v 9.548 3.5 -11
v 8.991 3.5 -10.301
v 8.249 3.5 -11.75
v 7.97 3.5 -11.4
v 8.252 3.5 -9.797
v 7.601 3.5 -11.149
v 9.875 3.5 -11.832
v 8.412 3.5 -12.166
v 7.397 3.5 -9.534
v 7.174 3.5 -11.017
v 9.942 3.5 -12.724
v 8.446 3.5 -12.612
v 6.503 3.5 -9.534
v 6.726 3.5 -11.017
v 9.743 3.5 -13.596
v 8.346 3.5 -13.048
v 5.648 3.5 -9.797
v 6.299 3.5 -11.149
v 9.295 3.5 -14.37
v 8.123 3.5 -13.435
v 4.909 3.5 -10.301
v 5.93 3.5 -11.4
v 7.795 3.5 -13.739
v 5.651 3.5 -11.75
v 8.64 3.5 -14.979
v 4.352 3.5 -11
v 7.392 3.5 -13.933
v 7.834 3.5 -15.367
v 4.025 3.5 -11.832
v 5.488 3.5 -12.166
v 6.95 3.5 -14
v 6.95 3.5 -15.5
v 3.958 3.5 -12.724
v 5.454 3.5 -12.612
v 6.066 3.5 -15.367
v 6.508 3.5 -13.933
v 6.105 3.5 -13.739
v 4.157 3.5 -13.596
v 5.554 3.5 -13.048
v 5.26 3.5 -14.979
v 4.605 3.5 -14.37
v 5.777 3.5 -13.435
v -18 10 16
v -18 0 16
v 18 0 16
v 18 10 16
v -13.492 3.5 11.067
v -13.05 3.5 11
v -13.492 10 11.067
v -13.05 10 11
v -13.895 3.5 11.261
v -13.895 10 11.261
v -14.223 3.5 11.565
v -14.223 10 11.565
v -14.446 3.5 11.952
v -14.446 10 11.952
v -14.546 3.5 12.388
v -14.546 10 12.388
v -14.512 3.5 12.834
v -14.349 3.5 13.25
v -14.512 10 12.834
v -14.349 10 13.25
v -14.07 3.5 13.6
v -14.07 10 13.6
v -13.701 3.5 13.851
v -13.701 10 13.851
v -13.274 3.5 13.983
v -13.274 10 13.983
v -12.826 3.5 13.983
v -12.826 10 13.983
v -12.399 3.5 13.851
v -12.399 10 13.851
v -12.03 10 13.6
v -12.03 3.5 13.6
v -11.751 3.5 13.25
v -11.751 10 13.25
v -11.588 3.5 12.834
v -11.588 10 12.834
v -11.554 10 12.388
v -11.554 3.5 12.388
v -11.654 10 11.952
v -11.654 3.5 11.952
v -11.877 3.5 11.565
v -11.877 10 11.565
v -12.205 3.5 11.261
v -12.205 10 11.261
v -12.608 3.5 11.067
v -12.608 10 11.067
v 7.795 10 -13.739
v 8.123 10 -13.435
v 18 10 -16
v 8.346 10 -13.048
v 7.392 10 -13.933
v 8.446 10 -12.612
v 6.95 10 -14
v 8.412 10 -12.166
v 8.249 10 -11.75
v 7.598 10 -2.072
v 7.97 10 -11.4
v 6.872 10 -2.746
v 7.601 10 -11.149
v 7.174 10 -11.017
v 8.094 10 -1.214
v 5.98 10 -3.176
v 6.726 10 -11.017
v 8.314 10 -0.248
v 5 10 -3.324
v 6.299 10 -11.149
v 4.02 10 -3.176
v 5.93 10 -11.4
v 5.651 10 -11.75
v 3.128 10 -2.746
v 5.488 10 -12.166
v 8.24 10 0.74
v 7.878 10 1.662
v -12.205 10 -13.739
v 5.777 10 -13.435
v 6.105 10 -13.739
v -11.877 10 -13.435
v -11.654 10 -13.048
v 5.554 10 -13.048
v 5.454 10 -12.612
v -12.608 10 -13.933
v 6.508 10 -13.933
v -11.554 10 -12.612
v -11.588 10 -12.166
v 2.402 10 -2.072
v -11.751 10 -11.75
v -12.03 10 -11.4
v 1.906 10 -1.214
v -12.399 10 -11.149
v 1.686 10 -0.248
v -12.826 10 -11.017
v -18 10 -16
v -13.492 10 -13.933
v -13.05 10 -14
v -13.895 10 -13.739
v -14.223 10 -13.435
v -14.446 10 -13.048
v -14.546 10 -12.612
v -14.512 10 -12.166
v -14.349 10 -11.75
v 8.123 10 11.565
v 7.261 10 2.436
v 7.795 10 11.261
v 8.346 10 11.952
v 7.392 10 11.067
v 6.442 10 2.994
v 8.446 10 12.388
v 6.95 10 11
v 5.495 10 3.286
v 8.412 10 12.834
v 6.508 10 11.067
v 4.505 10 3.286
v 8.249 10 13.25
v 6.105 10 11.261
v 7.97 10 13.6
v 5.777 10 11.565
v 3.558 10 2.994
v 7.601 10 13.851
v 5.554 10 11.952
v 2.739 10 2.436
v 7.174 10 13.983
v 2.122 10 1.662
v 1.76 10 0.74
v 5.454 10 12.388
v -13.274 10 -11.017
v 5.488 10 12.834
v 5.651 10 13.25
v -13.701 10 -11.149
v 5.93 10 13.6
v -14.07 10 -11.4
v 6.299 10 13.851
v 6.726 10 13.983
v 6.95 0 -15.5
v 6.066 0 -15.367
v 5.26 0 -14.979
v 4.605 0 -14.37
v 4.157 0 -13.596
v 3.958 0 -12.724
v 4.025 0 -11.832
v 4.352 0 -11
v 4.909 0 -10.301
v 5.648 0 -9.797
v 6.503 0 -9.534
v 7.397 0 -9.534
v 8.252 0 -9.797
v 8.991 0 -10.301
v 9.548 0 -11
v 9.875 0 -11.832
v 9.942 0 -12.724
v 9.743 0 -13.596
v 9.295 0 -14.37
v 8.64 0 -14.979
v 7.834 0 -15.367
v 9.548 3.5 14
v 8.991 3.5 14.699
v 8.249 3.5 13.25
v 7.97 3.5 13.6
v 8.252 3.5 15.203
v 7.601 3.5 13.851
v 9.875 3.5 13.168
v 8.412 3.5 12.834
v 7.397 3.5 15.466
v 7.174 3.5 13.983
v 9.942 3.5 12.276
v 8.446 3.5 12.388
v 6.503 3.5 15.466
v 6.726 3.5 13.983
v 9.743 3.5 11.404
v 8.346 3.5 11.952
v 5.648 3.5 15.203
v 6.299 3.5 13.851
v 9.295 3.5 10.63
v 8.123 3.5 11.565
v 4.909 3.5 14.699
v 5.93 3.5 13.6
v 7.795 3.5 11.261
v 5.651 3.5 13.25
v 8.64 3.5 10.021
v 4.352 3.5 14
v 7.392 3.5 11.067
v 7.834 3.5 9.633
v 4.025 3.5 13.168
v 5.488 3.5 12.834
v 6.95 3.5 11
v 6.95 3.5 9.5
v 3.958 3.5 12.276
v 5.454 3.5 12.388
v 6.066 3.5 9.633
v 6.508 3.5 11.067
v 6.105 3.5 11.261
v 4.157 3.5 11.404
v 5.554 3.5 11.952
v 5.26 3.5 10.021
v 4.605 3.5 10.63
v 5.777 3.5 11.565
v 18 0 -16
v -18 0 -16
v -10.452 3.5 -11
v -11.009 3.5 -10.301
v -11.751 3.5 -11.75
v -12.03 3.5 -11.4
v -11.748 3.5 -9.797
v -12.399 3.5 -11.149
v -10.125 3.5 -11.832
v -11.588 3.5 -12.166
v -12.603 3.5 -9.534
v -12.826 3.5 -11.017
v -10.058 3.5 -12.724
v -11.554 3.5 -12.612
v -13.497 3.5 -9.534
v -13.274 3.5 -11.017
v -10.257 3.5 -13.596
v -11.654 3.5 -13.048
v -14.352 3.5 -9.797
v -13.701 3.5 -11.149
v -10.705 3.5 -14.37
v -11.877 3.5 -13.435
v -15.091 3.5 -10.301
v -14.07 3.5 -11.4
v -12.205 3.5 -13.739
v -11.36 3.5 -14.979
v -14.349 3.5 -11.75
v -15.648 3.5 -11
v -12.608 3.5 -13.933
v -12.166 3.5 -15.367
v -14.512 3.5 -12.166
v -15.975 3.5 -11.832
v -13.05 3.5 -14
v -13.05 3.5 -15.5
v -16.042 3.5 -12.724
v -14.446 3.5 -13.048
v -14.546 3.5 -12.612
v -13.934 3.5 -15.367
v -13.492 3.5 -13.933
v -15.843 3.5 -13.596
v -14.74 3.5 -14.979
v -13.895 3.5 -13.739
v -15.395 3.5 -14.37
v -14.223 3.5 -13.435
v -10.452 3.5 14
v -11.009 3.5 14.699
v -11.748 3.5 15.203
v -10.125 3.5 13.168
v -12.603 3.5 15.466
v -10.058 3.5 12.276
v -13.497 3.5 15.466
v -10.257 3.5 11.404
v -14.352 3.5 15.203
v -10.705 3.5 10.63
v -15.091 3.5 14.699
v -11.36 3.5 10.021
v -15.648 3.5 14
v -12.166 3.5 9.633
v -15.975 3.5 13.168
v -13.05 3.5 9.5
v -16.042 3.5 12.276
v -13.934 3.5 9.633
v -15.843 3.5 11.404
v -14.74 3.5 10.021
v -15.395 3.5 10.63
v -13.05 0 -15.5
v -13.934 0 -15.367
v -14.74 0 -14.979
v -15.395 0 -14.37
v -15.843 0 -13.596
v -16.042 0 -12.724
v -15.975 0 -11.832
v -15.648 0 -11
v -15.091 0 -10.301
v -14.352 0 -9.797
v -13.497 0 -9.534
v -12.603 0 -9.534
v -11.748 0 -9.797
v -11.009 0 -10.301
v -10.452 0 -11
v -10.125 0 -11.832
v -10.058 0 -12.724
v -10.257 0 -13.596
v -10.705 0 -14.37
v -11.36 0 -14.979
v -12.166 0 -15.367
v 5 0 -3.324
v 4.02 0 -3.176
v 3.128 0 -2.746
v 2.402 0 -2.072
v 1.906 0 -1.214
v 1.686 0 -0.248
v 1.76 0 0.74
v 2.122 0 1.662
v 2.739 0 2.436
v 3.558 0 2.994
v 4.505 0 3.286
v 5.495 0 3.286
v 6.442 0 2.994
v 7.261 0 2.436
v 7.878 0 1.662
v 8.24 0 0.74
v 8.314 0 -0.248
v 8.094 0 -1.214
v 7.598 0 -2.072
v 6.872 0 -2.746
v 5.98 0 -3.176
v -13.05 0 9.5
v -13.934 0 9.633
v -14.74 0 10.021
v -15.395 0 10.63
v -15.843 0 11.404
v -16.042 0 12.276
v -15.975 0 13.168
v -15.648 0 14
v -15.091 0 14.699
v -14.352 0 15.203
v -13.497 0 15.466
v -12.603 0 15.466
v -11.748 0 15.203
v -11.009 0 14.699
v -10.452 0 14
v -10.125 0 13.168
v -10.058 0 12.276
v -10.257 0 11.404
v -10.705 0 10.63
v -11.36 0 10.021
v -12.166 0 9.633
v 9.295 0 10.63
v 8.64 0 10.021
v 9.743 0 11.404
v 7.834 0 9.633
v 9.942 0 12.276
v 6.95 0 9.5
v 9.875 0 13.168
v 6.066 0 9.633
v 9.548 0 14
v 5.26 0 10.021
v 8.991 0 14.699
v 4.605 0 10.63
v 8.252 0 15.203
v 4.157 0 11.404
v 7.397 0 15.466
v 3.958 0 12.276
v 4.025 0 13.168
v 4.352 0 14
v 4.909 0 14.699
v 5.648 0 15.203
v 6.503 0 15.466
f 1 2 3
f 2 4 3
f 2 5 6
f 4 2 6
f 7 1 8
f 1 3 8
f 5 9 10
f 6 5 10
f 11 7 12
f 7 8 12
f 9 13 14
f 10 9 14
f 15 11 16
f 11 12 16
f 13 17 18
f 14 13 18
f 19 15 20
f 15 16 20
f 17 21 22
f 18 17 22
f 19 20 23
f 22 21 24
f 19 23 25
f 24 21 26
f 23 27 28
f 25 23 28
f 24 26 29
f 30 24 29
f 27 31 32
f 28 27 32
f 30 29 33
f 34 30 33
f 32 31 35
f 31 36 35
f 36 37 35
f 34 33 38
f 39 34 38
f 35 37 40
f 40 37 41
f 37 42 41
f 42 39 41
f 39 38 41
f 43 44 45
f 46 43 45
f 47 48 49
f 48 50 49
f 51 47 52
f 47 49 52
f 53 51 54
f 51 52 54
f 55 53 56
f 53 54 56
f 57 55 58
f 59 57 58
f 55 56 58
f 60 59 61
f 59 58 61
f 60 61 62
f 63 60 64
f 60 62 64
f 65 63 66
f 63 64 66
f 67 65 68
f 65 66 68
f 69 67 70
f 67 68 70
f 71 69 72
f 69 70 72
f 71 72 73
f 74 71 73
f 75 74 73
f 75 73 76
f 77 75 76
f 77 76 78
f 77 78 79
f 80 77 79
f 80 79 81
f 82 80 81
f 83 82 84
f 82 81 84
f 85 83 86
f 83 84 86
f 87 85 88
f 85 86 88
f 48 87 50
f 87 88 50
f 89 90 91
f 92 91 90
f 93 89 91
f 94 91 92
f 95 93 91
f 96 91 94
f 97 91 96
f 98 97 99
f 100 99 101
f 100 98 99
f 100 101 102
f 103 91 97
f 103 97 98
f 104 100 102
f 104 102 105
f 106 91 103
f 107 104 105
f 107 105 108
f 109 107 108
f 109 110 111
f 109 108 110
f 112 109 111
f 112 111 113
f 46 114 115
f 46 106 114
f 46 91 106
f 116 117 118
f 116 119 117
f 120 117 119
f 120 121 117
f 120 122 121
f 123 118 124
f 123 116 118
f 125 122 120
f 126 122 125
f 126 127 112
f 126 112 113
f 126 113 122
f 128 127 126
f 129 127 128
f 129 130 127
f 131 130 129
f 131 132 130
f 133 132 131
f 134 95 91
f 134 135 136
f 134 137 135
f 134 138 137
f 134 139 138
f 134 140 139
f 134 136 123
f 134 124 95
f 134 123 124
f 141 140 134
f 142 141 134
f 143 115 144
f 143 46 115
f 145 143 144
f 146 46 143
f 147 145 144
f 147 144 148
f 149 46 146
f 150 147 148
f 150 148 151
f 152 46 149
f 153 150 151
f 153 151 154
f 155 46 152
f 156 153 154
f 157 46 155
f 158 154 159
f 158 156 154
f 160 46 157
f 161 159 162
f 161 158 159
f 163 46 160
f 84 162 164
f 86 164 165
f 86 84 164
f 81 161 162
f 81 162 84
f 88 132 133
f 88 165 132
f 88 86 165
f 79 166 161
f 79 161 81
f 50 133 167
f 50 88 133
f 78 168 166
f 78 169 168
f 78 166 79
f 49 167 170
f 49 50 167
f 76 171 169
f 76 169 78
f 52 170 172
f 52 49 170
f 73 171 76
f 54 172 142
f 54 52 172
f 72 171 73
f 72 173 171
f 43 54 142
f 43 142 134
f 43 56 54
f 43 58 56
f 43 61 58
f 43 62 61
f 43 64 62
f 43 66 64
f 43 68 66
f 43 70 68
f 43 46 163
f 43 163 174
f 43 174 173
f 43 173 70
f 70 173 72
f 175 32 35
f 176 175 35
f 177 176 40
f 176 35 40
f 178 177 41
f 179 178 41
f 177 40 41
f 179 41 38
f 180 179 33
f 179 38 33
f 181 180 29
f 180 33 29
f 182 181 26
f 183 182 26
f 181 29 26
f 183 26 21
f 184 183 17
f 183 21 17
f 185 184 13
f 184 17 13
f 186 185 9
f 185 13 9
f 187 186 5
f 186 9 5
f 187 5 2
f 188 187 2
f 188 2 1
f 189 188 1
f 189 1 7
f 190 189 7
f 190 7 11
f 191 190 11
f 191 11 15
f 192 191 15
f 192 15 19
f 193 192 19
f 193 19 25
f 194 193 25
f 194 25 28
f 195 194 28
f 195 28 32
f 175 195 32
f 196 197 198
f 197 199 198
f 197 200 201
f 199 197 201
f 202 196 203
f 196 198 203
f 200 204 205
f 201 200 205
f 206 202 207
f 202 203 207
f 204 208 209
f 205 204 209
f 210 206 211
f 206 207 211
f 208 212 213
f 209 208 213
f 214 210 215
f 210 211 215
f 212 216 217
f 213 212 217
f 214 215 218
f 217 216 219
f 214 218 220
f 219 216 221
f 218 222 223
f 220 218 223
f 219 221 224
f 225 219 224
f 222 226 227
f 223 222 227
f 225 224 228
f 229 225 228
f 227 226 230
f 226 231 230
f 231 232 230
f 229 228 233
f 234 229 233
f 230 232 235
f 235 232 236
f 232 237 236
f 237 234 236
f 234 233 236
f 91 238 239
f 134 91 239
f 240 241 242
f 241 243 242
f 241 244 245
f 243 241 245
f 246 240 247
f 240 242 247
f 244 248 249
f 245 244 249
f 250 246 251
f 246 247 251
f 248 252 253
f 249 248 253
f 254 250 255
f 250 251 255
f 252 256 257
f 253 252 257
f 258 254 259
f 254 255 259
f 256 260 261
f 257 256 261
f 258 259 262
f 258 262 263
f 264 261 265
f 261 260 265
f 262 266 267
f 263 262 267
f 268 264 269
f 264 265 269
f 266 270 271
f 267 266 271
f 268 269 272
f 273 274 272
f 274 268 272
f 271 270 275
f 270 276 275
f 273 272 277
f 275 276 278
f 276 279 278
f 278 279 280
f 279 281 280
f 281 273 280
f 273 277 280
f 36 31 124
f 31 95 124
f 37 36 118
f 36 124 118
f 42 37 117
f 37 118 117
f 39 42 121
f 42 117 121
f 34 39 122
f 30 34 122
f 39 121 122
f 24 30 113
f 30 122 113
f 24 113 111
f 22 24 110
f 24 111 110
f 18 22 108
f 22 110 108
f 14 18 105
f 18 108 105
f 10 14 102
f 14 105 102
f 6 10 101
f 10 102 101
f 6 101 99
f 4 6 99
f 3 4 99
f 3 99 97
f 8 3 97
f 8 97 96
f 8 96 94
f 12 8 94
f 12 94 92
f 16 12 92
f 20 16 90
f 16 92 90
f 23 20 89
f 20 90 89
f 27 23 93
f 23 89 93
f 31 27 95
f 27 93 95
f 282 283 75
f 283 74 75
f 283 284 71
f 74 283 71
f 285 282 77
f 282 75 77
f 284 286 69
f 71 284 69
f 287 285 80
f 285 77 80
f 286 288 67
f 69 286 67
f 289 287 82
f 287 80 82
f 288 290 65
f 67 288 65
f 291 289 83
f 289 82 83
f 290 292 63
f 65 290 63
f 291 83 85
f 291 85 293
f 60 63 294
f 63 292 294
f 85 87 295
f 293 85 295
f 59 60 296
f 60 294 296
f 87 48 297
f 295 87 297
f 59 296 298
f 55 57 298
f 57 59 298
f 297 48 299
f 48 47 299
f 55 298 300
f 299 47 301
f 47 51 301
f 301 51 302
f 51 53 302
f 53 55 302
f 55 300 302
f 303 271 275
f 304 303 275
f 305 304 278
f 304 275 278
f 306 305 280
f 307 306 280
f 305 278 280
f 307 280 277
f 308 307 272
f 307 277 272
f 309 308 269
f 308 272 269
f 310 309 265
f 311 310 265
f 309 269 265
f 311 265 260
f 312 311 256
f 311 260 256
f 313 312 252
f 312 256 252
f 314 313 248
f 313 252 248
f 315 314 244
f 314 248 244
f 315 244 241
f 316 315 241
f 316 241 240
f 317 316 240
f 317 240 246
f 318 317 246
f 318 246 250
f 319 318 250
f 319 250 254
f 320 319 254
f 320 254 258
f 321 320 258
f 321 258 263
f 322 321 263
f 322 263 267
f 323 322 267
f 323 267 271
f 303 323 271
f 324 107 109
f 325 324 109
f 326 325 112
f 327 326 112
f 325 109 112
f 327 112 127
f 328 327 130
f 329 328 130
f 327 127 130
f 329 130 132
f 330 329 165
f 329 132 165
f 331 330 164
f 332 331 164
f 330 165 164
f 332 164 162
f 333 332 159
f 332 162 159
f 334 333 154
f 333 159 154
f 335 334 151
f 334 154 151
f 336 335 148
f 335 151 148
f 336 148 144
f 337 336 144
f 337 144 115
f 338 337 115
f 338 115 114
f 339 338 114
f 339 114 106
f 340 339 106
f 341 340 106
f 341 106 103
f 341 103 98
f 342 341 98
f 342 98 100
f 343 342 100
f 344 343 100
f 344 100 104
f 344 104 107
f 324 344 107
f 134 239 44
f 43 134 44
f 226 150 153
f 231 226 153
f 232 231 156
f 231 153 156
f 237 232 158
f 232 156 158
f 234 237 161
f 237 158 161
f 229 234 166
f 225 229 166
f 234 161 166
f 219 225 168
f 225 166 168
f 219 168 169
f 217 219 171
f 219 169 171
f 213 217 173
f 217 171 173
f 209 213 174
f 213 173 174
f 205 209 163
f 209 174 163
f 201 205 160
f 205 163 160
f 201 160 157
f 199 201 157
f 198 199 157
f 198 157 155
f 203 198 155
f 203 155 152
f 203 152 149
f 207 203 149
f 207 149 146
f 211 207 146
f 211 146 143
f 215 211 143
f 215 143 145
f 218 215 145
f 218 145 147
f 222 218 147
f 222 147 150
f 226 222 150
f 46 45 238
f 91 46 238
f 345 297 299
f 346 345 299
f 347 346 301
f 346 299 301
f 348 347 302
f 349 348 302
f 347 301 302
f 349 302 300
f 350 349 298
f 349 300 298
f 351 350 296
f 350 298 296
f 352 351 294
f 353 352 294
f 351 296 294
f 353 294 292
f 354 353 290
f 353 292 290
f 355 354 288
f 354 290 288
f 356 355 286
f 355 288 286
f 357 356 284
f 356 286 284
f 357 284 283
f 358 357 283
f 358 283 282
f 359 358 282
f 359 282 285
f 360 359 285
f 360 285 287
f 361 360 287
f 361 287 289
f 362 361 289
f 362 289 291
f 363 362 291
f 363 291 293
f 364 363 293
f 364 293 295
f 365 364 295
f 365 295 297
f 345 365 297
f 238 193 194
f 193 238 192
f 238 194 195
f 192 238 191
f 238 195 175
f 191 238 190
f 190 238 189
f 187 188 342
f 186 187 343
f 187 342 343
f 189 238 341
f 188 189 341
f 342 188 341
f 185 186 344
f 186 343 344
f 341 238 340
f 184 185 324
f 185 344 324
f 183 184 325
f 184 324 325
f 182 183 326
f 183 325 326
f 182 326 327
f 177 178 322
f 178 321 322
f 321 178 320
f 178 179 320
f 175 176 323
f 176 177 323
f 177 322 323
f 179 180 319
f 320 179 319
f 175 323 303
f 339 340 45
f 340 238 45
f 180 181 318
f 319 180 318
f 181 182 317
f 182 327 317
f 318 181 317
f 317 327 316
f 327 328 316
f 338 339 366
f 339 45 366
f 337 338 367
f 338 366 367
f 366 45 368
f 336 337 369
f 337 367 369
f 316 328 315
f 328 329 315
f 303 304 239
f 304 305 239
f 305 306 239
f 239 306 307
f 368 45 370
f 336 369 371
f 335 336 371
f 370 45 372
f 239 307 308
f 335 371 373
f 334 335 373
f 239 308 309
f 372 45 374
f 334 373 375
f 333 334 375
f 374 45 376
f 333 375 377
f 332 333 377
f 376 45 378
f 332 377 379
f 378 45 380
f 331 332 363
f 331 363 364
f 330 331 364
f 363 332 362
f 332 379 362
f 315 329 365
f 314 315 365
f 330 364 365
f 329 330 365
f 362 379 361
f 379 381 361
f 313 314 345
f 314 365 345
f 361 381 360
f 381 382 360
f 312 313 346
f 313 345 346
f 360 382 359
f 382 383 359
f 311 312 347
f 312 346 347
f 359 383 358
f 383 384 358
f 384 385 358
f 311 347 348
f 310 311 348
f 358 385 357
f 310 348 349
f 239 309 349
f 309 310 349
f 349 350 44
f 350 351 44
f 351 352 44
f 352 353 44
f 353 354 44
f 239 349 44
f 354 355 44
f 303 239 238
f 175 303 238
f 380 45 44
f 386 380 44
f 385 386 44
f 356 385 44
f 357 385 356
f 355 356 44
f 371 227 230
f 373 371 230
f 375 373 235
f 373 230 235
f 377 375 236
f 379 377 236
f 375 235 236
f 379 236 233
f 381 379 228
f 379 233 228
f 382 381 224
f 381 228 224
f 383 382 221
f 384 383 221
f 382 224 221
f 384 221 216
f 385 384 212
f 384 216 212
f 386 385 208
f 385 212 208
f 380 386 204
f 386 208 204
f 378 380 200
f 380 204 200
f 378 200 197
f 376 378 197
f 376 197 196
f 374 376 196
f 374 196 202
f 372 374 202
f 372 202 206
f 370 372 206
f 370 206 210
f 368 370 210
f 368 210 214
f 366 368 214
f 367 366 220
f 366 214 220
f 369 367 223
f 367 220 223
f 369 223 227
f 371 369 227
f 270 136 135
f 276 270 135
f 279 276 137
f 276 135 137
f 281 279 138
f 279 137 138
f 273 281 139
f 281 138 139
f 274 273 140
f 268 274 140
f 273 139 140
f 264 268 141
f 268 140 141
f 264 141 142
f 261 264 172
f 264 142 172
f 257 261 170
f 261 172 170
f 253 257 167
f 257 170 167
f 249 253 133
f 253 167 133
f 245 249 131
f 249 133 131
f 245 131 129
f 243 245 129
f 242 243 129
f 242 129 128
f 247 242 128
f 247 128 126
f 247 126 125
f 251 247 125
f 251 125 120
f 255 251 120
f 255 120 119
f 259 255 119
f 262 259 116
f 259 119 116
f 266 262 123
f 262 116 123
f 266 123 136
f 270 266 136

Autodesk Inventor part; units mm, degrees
ref_plane "YZ Plane" through (0, 0, 0) normal (1, 0, 0) x (0, 1, 0)
ref_plane "XZ Plane" through (0, 0, 0) normal (0, 1, 0) x (-1, 0, 0)
ref_plane "XY Plane" through (0, 0, 0) normal (0, 0, 1) x (1, 0, 0)
sketch "Sketch1" plane through (0, 0, 0) normal (0, 1, 0) x (-1, 0, 0)
  line L0 (18, 16) -> (-18, 16)
  line L1 (-18, 16) -> (-18, -16)
  line L2 (-18, -16) -> (18, -16)
  line L3 (18, -16) -> (18, 16)
  line L4 (18, 16) -> (-18, -16) construction
  line L5 (-18, 16) -> (18, -16) construction
  point P0 (0, 0)
  dimension "d0" = 36
  dimension "d1" = 32
extrude "Extrusion1" add sketch "Sketch1" along normal blind 10
sketch "Sketch2" plane through (0, 0, 0) normal (0, -1, 0) x (1, 0, 0)
  circle A0 centre (6.95, 12.5) radius 1.2295 projected
  circle A1 centre (6.95, -12.5) radius 1.2295 projected
  circle A2 centre (-13.05, -12.5) radius 1.2295 projected
  circle A3 centre (-13.05, 12.5) radius 1.2295 projected
  line L0 (-24.1, 15) -> (18, 15) projected
  line L1 (-24.1, -15) -> (-24.1, 15) projected
  line L2 (18, -15) -> (-24.1, -15) projected
  line L3 (18, 15) -> (18, -15) projected
  point P0 (0, 0)
hole "Hole1" at (6.95, 0, -12.5) at (-13.05, 0, -12.5) at (6.95, 0, 12.5) at (-13.05, 0, 12.5) direction (0, 1, 0) diameter 3 end through all counterbore diameter 6 counterbore depth 3.5
sketch "Sketch3" plane through (0, 0, 0) normal (0, -1, 0) x (1, 0, 0)
  circle A0 centre (-13.05, 12.5) radius 3 projected
  circle A1 centre (6.95, 12.5) radius 3 projected
  circle A2 centre (-13.05, -12.5) radius 3 projected
  circle A3 centre (6.95, -12.5) radius 3 projected
  line L0 (18, 16) -> (18, -16) projected
  line L1 (-18, 16) -> (18, 16) projected
  line L2 (-18, -16) -> (-18, 16) projected
  line L3 (18, -16) -> (-18, -16) projected
  point P0 (0, 0)
  point P1 (5, 0)
  dimension "d11" = 5
hole "Hole2" at (5, 0, 0) direction (0, 1, 0) diameter 6.647 end through all thread size "M8x1.25" class "6H" standard "ISO Metric profile"
properties part number "LM Cart Braket" material "Aluminum 6061-AHC"
